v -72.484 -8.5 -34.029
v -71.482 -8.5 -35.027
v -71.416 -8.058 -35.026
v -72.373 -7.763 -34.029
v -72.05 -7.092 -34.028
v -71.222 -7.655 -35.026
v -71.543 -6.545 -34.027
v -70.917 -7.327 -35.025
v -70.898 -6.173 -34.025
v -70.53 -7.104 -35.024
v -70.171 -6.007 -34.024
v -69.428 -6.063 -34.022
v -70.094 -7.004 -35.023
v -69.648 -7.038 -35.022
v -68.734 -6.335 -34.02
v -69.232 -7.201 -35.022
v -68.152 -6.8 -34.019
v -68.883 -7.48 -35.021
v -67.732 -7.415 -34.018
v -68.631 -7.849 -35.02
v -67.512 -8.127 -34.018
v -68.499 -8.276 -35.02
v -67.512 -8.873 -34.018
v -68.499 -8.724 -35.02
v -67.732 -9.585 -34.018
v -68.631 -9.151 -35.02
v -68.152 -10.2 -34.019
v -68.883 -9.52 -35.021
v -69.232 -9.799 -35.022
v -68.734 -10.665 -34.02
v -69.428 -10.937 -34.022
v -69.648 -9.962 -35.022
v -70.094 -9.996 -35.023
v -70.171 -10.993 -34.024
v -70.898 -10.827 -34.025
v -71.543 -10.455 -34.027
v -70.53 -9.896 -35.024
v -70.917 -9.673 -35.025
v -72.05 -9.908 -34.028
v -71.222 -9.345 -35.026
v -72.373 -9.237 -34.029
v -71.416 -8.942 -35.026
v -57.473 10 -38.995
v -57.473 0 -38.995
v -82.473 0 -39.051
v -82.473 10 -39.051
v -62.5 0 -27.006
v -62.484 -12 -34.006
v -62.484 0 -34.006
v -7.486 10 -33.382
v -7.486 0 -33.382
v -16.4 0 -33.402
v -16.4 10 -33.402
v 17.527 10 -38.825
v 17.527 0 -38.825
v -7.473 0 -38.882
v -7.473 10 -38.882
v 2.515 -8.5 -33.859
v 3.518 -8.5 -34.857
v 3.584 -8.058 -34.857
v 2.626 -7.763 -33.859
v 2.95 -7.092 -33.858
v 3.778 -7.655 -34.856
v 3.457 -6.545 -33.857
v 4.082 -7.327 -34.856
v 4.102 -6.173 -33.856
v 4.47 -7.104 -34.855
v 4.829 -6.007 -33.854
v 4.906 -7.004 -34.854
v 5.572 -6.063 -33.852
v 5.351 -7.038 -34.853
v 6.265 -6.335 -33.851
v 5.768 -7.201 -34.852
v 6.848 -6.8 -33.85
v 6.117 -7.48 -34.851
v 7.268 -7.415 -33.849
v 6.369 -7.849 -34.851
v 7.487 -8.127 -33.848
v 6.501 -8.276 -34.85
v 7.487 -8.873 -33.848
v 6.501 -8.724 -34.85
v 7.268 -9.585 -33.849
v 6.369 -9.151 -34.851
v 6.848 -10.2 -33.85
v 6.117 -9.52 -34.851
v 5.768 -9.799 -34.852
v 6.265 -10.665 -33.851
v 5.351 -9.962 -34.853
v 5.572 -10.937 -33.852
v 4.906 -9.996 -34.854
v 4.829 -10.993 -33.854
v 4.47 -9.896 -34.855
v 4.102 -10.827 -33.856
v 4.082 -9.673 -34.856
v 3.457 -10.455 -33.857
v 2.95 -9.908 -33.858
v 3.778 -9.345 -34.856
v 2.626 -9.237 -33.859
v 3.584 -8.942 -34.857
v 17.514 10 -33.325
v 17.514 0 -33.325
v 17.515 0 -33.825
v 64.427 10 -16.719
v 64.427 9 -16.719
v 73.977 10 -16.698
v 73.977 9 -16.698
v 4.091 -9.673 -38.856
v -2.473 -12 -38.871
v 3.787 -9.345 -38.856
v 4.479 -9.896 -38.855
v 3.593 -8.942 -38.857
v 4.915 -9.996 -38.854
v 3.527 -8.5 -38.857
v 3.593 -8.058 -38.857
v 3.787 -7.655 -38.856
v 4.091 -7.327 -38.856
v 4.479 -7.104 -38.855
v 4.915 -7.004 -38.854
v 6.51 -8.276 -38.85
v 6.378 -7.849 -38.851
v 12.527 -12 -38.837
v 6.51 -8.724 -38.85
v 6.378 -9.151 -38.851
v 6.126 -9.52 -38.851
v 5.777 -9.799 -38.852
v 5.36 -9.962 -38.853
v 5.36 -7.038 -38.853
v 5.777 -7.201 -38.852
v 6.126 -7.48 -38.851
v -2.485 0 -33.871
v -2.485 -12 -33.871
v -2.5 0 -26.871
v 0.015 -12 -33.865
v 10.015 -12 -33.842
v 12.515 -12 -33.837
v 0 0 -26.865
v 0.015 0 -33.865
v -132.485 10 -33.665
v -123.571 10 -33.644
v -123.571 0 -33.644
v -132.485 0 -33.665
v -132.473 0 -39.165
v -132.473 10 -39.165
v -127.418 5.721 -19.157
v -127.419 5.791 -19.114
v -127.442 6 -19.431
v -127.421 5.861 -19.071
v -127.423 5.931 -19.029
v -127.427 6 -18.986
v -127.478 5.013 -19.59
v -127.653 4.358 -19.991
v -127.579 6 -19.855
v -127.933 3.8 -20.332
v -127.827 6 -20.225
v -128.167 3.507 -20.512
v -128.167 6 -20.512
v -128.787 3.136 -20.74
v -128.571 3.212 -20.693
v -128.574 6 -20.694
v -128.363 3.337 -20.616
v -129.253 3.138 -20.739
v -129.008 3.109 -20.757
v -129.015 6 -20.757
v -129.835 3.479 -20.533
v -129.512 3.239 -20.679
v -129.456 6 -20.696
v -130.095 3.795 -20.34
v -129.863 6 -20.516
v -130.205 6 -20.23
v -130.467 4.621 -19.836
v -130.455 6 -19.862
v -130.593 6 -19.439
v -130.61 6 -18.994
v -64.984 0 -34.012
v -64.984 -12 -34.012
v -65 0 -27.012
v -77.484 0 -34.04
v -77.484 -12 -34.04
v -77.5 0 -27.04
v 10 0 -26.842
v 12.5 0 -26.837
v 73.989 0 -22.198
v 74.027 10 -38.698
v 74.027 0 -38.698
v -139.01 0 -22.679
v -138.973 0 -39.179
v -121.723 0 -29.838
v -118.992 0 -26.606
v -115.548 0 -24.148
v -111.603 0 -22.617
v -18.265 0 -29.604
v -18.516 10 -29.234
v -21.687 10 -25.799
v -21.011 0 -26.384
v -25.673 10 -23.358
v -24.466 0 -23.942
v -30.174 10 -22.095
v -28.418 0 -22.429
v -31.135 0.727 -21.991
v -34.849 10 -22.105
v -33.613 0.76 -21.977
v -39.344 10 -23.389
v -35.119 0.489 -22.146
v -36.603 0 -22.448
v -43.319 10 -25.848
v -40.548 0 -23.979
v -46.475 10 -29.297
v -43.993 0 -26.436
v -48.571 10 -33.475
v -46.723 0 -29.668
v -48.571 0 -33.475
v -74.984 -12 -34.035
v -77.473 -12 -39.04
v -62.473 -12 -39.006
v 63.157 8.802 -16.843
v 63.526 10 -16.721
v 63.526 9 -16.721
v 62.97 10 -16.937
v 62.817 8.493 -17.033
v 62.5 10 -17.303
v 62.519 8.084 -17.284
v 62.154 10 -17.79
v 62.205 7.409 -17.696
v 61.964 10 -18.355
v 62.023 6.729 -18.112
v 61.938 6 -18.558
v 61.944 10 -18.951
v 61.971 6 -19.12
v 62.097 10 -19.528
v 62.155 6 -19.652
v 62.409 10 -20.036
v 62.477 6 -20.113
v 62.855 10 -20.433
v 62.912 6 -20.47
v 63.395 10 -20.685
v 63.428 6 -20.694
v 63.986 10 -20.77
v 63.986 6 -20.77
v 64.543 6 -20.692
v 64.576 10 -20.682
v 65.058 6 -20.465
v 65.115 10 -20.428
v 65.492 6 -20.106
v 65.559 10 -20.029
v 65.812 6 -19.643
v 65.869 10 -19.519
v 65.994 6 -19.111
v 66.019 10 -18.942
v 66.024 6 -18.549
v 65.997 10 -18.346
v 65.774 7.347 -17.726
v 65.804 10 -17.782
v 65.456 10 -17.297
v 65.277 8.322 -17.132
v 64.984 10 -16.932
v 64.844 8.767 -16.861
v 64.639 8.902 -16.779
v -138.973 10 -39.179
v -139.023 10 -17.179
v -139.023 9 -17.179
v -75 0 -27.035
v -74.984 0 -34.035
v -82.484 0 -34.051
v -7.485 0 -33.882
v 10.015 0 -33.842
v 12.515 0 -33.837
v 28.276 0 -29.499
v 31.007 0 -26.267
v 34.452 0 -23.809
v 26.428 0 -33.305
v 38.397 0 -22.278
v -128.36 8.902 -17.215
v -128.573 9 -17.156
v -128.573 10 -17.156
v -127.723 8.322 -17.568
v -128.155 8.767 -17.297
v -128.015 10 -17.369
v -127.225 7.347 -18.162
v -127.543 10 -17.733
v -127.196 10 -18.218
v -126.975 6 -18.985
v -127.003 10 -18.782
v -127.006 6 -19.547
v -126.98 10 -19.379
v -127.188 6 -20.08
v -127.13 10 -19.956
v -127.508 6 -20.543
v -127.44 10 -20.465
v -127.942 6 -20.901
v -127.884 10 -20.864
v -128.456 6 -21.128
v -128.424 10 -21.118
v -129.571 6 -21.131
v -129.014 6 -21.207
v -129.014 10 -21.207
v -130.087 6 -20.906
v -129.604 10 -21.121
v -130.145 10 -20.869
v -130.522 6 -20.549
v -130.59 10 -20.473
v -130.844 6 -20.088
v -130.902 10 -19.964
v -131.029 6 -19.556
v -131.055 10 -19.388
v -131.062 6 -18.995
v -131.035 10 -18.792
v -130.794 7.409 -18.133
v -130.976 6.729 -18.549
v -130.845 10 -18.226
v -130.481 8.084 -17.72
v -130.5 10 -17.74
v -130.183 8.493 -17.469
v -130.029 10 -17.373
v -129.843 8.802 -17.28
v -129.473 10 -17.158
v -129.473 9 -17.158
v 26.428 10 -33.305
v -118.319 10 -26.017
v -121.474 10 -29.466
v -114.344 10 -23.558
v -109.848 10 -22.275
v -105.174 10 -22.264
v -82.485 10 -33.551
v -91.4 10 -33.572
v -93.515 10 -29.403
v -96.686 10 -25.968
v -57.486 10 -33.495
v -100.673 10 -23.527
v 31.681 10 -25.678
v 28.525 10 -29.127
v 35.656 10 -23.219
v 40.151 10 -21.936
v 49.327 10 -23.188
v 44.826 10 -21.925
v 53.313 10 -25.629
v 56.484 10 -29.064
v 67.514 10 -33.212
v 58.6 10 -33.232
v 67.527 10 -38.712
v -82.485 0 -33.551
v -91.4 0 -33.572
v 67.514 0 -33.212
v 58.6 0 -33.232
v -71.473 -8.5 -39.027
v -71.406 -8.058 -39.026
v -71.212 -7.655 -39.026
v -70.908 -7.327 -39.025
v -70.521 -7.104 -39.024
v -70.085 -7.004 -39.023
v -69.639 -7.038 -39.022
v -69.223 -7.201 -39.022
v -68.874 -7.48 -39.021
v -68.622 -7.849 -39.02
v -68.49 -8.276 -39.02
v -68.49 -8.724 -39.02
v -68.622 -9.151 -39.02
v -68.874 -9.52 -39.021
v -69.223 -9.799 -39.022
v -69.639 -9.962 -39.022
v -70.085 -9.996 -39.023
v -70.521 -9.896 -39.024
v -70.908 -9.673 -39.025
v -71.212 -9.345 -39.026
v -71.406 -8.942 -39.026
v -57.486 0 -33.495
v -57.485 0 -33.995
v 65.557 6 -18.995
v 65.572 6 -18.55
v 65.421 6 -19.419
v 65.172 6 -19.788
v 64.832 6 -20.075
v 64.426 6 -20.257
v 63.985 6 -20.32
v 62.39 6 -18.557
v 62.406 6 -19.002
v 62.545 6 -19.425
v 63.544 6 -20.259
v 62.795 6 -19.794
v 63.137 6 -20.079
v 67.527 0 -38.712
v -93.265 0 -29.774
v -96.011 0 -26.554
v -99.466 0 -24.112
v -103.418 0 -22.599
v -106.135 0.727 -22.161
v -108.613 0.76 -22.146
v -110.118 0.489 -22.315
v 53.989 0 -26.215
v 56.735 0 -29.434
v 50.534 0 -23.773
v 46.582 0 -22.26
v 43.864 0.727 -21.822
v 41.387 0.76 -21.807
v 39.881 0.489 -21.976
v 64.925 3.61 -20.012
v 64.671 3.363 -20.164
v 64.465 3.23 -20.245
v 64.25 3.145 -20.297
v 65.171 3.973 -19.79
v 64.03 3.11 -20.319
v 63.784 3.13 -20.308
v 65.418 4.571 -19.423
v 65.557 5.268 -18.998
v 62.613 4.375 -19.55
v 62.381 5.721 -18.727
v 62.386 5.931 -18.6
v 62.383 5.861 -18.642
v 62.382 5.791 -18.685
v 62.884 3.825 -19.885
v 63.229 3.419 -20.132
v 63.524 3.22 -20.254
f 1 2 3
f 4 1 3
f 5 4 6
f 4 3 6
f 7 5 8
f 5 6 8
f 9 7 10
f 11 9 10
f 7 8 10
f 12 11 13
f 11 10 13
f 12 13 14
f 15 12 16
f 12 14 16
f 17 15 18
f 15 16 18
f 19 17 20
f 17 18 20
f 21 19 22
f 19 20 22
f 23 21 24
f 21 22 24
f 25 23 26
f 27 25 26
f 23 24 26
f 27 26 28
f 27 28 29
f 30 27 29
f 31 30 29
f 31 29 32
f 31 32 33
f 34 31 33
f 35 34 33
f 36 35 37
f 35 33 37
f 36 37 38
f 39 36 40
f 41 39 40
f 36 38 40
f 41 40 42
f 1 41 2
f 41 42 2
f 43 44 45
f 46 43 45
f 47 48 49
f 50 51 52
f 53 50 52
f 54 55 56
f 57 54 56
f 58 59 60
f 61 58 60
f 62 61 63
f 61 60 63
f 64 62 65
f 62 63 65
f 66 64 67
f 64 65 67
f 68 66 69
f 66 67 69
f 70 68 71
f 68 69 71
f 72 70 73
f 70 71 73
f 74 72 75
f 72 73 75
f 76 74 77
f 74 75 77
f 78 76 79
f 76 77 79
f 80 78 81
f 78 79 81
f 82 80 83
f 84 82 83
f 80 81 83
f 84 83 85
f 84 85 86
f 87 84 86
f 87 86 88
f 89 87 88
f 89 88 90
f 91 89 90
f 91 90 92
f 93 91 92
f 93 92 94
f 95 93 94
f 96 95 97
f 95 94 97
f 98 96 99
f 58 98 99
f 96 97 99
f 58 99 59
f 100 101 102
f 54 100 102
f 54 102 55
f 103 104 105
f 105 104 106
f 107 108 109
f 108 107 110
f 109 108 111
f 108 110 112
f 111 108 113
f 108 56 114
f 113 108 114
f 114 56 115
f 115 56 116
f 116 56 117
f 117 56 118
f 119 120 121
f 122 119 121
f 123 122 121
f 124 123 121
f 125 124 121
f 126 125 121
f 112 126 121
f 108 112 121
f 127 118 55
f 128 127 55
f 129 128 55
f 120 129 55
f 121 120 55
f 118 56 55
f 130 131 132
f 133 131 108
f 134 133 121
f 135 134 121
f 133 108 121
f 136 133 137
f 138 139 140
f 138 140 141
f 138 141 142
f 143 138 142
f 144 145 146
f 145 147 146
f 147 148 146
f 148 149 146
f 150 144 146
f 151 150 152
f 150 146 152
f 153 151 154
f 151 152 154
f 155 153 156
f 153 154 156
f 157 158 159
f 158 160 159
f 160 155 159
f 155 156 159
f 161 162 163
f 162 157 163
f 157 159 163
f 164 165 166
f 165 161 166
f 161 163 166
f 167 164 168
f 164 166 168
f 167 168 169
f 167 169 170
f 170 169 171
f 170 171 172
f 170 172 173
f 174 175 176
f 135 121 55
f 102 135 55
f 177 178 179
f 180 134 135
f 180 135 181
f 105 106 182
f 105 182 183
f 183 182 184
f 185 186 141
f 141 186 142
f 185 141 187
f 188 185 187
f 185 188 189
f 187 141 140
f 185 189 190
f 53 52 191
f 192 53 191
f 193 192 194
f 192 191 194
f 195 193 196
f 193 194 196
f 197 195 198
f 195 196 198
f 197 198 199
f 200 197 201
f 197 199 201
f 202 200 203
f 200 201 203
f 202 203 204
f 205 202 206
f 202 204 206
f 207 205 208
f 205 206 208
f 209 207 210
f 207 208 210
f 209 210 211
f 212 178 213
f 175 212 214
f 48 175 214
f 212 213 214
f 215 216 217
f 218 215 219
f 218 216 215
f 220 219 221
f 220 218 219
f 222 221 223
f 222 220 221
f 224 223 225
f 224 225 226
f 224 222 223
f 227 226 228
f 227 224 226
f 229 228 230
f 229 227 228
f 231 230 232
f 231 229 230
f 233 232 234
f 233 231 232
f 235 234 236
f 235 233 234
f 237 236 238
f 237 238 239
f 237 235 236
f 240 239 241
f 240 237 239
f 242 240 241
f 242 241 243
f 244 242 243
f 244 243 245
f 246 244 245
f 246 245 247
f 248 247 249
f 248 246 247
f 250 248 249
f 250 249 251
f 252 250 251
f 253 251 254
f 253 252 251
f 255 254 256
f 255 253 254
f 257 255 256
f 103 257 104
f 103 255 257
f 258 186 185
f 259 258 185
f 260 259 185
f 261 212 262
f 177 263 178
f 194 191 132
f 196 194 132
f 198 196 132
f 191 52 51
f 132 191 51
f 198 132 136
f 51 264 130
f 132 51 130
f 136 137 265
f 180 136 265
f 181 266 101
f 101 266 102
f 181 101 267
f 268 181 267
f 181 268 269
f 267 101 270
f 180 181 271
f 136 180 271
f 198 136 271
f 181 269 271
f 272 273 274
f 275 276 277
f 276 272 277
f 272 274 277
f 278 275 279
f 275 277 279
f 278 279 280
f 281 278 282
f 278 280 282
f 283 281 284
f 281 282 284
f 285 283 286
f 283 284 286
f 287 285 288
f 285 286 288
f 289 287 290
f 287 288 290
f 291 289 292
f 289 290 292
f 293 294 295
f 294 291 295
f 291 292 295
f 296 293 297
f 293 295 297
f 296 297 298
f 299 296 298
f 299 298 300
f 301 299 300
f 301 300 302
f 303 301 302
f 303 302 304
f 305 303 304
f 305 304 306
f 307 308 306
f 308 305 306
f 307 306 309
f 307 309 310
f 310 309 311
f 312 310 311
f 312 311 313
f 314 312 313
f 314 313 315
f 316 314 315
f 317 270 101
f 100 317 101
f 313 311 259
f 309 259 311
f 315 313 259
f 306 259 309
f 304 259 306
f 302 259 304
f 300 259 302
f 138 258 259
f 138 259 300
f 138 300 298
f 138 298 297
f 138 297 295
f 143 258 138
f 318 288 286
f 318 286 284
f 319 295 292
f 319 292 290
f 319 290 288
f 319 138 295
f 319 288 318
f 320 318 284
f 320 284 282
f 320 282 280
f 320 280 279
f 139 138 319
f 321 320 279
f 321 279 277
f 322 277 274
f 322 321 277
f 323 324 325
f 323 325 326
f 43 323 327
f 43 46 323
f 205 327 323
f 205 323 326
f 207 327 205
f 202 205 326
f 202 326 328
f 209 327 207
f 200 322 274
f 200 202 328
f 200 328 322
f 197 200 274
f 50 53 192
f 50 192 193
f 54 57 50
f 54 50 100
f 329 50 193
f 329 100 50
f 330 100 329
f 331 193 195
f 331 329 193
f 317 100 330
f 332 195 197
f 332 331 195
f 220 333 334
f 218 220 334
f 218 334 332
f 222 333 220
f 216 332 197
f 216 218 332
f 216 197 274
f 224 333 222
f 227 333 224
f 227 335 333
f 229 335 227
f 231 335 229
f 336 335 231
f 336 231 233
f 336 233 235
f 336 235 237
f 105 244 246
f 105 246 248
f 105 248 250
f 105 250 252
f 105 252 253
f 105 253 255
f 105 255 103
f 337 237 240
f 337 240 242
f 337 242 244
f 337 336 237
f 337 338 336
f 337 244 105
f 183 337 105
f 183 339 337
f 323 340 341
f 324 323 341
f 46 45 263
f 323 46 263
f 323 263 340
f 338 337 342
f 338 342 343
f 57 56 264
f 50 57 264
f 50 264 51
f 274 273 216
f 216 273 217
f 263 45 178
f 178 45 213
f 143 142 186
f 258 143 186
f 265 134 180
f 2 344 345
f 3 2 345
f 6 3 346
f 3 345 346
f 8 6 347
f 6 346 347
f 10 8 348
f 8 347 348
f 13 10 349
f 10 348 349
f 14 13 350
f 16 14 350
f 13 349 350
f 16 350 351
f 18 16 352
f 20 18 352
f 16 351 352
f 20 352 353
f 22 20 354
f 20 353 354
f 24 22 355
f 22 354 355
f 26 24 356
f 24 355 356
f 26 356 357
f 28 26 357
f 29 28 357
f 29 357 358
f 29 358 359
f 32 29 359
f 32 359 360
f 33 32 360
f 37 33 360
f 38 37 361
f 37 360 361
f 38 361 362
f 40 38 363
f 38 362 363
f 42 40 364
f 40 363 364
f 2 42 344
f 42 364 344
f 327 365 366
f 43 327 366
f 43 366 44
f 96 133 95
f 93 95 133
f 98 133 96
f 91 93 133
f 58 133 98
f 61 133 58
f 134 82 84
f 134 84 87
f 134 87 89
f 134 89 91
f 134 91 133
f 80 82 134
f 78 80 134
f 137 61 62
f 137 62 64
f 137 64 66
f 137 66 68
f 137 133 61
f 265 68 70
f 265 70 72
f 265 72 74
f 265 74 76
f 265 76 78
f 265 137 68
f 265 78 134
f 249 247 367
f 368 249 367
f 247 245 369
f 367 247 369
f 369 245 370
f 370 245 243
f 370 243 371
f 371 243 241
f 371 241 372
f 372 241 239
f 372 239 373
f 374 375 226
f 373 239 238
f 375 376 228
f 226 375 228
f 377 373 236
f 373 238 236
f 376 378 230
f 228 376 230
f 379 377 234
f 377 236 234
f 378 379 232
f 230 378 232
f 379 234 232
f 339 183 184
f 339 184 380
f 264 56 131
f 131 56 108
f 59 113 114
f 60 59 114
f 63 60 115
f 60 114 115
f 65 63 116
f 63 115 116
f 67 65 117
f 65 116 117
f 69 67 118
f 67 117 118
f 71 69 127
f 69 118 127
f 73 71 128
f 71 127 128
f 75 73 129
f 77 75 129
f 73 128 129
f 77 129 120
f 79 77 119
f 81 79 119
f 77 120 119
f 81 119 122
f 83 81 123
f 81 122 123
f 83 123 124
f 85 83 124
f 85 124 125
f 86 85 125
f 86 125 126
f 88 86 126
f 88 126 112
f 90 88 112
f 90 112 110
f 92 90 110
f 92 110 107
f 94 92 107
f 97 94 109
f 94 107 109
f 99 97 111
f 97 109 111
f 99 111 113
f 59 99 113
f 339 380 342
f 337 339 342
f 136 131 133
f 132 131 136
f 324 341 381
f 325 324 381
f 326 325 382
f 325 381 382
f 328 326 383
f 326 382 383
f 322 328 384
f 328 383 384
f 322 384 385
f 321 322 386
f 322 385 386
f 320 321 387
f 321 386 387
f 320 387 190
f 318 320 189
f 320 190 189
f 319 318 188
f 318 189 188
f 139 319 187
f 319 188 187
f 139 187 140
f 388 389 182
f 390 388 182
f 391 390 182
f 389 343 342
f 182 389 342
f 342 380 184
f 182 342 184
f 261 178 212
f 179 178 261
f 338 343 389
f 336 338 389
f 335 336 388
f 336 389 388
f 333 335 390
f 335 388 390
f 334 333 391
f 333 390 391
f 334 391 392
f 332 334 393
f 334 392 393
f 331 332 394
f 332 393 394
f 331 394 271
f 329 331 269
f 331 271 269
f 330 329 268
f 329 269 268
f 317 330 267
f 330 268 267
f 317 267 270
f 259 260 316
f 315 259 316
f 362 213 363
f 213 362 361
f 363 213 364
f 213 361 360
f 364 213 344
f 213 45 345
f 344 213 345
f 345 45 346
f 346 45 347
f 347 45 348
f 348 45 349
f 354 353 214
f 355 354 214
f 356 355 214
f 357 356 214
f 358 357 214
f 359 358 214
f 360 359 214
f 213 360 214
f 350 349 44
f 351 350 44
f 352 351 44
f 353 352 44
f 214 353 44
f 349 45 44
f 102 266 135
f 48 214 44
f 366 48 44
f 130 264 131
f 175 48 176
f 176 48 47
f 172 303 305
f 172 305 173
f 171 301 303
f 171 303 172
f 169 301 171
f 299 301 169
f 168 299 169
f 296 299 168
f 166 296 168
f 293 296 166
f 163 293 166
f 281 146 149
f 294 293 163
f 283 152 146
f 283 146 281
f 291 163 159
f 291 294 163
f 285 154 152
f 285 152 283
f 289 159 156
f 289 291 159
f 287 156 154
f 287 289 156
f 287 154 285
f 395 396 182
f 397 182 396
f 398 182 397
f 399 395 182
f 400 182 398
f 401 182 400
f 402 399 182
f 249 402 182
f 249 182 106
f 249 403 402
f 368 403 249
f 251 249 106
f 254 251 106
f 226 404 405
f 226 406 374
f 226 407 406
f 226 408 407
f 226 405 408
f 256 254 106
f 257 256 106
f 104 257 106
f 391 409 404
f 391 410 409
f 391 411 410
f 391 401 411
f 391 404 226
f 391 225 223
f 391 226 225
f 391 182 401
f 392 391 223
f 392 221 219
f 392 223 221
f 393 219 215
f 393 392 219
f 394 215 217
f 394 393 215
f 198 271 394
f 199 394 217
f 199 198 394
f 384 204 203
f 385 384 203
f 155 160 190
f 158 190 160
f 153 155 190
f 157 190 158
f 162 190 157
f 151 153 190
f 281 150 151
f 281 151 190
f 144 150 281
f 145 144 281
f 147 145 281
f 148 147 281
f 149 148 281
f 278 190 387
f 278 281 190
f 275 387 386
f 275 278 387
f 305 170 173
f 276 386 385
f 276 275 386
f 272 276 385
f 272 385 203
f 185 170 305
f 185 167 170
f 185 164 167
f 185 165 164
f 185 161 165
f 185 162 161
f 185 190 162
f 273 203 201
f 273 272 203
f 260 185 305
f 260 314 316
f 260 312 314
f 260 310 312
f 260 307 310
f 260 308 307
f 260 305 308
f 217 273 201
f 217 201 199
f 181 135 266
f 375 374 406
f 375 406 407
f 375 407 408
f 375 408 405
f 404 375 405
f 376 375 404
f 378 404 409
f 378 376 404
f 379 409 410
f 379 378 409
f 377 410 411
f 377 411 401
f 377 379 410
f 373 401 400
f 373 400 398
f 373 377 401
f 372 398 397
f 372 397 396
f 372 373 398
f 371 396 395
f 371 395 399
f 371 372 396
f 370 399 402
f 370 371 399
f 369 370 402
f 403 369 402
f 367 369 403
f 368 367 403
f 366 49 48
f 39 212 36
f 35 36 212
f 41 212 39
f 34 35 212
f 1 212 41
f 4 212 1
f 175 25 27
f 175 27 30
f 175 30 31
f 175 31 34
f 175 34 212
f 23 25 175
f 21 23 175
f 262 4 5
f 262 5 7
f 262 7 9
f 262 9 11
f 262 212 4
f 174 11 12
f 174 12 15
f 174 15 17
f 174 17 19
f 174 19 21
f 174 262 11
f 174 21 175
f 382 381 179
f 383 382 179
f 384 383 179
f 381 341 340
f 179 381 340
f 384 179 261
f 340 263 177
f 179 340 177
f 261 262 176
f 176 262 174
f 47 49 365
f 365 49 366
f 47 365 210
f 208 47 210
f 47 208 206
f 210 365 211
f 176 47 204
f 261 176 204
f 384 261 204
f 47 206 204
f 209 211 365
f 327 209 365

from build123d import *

# Parameters (mm, degrees)
BOSS_EXTRUDE3_DEPTH        = 10
SKETCH4_R                  = 1.5
BOSS_EXTRUDE4_DEPTH        = 5
RIB6_REACH                 = 158.985
SKETCH5_WALL_W             = 329.861950248
SKETCH5_WALL_H             = 2.5
CHAMFER2_SIZE              = 1
CHAMFER3_SIZE              = 5.5
CHAMFER3_SIZE_2            = 9
LPATTERN4_COUNT            = 2
LPATTERN4_PITCH            = 75
LPATTERN4_COPY_1_REACH     = 158.985
LPATTERN4_COPY_1_SKETCH_W  = 329.861950248
LPATTERN4_COPY_1_SKETCH_H  = 2.5
CHAMFER2_OF_LPATTERN4_SIZE = 1
SKETCH8_R                  = 2.05
CUT_EXTRUDE1_DEPTH         = 4
SKETCH9_R                  = 1.6
CUT_EXTRUDE2_DEPTH         = 5


with BuildPart() as part:
    # Sketch2 → Boss-Extrude3 (new body)
    with BuildSketch(Plane(origin=(0, 0, 0), x_dir=(1, 0, 0), z_dir=(0, 1, 0))):
        with BuildLine():
            Line((-138.973021921, 39.179223473), (-139.022764358, 17.179279707))
            Line((-139.022764358, 17.179279707), (73.976691191, 16.697682479))
            Line((73.976691191, 16.697682479), (74.026978079, 38.697625014))
            Line((74.026978079, 38.697625014), (67.526578048, 38.712322585))
            Line((67.526578048, 38.712322585), (67.51414235, 33.212297518))
            Line((67.51414235, 33.212297518), (58.599731895, 33.232453229))
            ThreePointArc((58.599731895, 33.232453229), (42.488076808, 21.768891824), (26.428425, 33.305193378))
            Line((26.428425, 33.305193378), (17.51414235, 33.3253488))
            Line((17.51414235, 33.3253488), (17.526578048, 38.825373866))
            Line((17.526578048, 38.825373866), (-7.473230244, 38.881899074))
            Line((-7.473230244, 38.881899074), (-7.485665941, 33.381874007))
            Line((-7.485665941, 33.381874007), (-16.400076396, 33.402029717))
            ThreePointArc((-16.400076396, 33.402029717), (-32.511731484, 21.938468313), (-48.571383292, 33.474769867))
            Line((-48.571383292, 33.474769867), (-57.485665941, 33.494925288))
            Line((-57.485665941, 33.494925288), (-57.473230244, 38.994950355))
            Line((-57.473230244, 38.994950355), (-82.473038536, 39.051475562))
            Line((-82.473038536, 39.051475562), (-82.485474233, 33.551450496))
            Line((-82.485474233, 33.551450496), (-91.399884688, 33.571606206))
            ThreePointArc((-91.399884688, 33.571606206), (-107.511539776, 22.108044802), (-123.571191584, 33.644346356))
            Line((-123.571191584, 33.644346356), (-132.485474233, 33.664501777))
            Line((-132.485474233, 33.664501777), (-132.473038536, 39.164526844))
            Line((-132.473038536, 39.164526844), (-138.973021921, 39.179223473))
        make_face()
    extrude(amount=BOSS_EXTRUDE3_DEPTH)

    # Sketch4 → Boss-Extrude4 (add)
    with BuildSketch(Plane(origin=(0.087874316, 0, -38.864803222), x_dir=(-0.99999744389135, 0, -0.002261019850970016), z_dir=(0.002261019850970016, 0, -0.99999744389135))):
        Polygon((62.56118779, -12), (57.561251693, 0), (82.561123887, 0), (77.56118779, -12), align=None)
        with Locations((70.06118779, -8.5)):
            Circle(SKETCH4_R, mode=Mode.SUBTRACT)
    boss_extrude4 = extrude(amount=-BOSS_EXTRUDE4_DEPTH)

    # Sketch5 wall → Rib6 (add, up to next)
    with BuildSketch(Plane(origin=(-77.492333887, -6, -30.540192335), x_dir=(-0.001139262394, 0.863778900906, 0.503869737562), z_dir=(-0.001953021242, -0.503871025511, 0.863776692993)), mode=Mode.PRIVATE) as rib6_sk1:
        with Locations((0, -1.25)):
            Rectangle(SKETCH5_WALL_W, SKETCH5_WALL_H)
    rib6_tool1 = extrude(rib6_sk1.sketch, amount=-RIB6_REACH, mode=Mode.PRIVATE) - part.part
    rib6 = rib6_tool1.solids().sort_by_distance((-77.492333887, -6, -30.540192335))[0]
    add(rib6)

    # Mirror2: Rib6 across plane
    add(rib6.mirror(Plane(origin=(-70.061008706, 0, -0.158409736), x_dir=(-0.0022610198509701073, 0, 0.99999744389135), z_dir=(0.99999744389135, 0, 0.002261019850970107))))

    # Chamfer2
    chamfer2_edges = [part.edges().sort_by_distance(p)[0] for p in [
        (-68.484443323, -8.5, -34.01983421),
    ]]
    chamfer(chamfer2_edges, length=CHAMFER2_SIZE)

    # Chamfer3
    # the kernel refuses this chamfer: 9, 5.5 mm, written as the material it takes off along each edge
    with BuildSketch(Plane(origin=(-162.295390883, 0, -17.231899712), x_dir=(0.0022577295255832275, -0.053929224624231706, -0.9985422081158205), z_dir=(0.9999974438913499, 0, 0.0022610198509699707))) as chamfer3_piece_1:
        Polygon((CHAMFER3_SIZE * 0.998544760505, CHAMFER3_SIZE * 0.0539292246242), (-CHAMFER3_SIZE_2 * 0.0539292246242, CHAMFER3_SIZE_2 * 0.998544760505), (0, 0), align=None)
    extrude(amount=259.545372026, mode=Mode.SUBTRACT)

    # LPattern4: Boss-Extrude4, Rib6 ×2
    with Locations(*[Vector(0.9999974438913499, 0, 0.002261019850970079) * (i * LPATTERN4_PITCH) for i in range(1, LPATTERN4_COUNT)]):
        add(boss_extrude4)
        add(rib6)

    # LPattern4 copy 1 sketch → LPattern4 copy 1 (add, up to next)
    with BuildSketch(Plane(origin=(12.507436062, -6, -30.336700548), x_dir=(-0.0011392623880184954, 0.863778900906, 0.5038697375620136), z_dir=(-0.0019530212415939509, -0.503871025511, 0.863776692993001)), mode=Mode.PRIVATE) as lpattern4_copy_1_sk1:
        with Locations((0, 1.25)):
            Rectangle(LPATTERN4_COPY_1_SKETCH_W, LPATTERN4_COPY_1_SKETCH_H)
    lpattern4_copy_1_tool1 = extrude(lpattern4_copy_1_sk1.sketch, amount=-LPATTERN4_COPY_1_REACH, mode=Mode.PRIVATE) - part.part
    add(lpattern4_copy_1_tool1.solids().sort_by_distance((12.507436062, -6, -30.336700548))[0])

    # Chamfer2 of LPattern4
    chamfer2_of_lpattern4_edges = [part.edges().sort_by_distance(p)[0] for p in [
        (6.515364969, -8.5, -33.850257721),
    ]]
    chamfer(chamfer2_of_lpattern4_edges, length=CHAMFER2_OF_LPATTERN4_SIZE)

    # Sketch8 → Cut-Extrude1 (cut)
    with BuildSketch(Plane(origin=(0, 10, 0), x_dir=(1, 0, 0), z_dir=(0, 1, 0))):
        with Locations((-129.018242433, 19.156613217)):
            Circle(SKETCH8_R)
    cut_extrude1 = extrude(amount=-CUT_EXTRUDE1_DEPTH, mode=Mode.SUBTRACT)

    # Sketch9 → Cut-Extrude2 (cut)
    with BuildSketch(Plane(origin=(0, 6, 0), x_dir=(1, 0, 0), z_dir=(0, 1, 0))):
        with Locations((-129.018242433, 19.156613217)):
            Circle(SKETCH9_R)
    cut_extrude2 = extrude(amount=-CUT_EXTRUDE2_DEPTH, mode=Mode.SUBTRACT)

    # Mirror4: Cut-Extrude1, Cut-Extrude2 across plane
    add(cut_extrude1.mirror(Plane(origin=(-32.561168463, 0, -0.073621636), x_dir=(-0.002261019850969509, 0, 0.99999744389135), z_dir=(-0.99999744389135, 0, -0.0022610198509695084))), mode=Mode.SUBTRACT)
    add(cut_extrude2.mirror(Plane(origin=(-32.561168463, 0, -0.073621636), x_dir=(-0.002261019850969509, 0, 0.99999744389135), z_dir=(-0.99999744389135, 0, -0.0022610198509695084))), mode=Mode.SUBTRACT)


solid = part.part
